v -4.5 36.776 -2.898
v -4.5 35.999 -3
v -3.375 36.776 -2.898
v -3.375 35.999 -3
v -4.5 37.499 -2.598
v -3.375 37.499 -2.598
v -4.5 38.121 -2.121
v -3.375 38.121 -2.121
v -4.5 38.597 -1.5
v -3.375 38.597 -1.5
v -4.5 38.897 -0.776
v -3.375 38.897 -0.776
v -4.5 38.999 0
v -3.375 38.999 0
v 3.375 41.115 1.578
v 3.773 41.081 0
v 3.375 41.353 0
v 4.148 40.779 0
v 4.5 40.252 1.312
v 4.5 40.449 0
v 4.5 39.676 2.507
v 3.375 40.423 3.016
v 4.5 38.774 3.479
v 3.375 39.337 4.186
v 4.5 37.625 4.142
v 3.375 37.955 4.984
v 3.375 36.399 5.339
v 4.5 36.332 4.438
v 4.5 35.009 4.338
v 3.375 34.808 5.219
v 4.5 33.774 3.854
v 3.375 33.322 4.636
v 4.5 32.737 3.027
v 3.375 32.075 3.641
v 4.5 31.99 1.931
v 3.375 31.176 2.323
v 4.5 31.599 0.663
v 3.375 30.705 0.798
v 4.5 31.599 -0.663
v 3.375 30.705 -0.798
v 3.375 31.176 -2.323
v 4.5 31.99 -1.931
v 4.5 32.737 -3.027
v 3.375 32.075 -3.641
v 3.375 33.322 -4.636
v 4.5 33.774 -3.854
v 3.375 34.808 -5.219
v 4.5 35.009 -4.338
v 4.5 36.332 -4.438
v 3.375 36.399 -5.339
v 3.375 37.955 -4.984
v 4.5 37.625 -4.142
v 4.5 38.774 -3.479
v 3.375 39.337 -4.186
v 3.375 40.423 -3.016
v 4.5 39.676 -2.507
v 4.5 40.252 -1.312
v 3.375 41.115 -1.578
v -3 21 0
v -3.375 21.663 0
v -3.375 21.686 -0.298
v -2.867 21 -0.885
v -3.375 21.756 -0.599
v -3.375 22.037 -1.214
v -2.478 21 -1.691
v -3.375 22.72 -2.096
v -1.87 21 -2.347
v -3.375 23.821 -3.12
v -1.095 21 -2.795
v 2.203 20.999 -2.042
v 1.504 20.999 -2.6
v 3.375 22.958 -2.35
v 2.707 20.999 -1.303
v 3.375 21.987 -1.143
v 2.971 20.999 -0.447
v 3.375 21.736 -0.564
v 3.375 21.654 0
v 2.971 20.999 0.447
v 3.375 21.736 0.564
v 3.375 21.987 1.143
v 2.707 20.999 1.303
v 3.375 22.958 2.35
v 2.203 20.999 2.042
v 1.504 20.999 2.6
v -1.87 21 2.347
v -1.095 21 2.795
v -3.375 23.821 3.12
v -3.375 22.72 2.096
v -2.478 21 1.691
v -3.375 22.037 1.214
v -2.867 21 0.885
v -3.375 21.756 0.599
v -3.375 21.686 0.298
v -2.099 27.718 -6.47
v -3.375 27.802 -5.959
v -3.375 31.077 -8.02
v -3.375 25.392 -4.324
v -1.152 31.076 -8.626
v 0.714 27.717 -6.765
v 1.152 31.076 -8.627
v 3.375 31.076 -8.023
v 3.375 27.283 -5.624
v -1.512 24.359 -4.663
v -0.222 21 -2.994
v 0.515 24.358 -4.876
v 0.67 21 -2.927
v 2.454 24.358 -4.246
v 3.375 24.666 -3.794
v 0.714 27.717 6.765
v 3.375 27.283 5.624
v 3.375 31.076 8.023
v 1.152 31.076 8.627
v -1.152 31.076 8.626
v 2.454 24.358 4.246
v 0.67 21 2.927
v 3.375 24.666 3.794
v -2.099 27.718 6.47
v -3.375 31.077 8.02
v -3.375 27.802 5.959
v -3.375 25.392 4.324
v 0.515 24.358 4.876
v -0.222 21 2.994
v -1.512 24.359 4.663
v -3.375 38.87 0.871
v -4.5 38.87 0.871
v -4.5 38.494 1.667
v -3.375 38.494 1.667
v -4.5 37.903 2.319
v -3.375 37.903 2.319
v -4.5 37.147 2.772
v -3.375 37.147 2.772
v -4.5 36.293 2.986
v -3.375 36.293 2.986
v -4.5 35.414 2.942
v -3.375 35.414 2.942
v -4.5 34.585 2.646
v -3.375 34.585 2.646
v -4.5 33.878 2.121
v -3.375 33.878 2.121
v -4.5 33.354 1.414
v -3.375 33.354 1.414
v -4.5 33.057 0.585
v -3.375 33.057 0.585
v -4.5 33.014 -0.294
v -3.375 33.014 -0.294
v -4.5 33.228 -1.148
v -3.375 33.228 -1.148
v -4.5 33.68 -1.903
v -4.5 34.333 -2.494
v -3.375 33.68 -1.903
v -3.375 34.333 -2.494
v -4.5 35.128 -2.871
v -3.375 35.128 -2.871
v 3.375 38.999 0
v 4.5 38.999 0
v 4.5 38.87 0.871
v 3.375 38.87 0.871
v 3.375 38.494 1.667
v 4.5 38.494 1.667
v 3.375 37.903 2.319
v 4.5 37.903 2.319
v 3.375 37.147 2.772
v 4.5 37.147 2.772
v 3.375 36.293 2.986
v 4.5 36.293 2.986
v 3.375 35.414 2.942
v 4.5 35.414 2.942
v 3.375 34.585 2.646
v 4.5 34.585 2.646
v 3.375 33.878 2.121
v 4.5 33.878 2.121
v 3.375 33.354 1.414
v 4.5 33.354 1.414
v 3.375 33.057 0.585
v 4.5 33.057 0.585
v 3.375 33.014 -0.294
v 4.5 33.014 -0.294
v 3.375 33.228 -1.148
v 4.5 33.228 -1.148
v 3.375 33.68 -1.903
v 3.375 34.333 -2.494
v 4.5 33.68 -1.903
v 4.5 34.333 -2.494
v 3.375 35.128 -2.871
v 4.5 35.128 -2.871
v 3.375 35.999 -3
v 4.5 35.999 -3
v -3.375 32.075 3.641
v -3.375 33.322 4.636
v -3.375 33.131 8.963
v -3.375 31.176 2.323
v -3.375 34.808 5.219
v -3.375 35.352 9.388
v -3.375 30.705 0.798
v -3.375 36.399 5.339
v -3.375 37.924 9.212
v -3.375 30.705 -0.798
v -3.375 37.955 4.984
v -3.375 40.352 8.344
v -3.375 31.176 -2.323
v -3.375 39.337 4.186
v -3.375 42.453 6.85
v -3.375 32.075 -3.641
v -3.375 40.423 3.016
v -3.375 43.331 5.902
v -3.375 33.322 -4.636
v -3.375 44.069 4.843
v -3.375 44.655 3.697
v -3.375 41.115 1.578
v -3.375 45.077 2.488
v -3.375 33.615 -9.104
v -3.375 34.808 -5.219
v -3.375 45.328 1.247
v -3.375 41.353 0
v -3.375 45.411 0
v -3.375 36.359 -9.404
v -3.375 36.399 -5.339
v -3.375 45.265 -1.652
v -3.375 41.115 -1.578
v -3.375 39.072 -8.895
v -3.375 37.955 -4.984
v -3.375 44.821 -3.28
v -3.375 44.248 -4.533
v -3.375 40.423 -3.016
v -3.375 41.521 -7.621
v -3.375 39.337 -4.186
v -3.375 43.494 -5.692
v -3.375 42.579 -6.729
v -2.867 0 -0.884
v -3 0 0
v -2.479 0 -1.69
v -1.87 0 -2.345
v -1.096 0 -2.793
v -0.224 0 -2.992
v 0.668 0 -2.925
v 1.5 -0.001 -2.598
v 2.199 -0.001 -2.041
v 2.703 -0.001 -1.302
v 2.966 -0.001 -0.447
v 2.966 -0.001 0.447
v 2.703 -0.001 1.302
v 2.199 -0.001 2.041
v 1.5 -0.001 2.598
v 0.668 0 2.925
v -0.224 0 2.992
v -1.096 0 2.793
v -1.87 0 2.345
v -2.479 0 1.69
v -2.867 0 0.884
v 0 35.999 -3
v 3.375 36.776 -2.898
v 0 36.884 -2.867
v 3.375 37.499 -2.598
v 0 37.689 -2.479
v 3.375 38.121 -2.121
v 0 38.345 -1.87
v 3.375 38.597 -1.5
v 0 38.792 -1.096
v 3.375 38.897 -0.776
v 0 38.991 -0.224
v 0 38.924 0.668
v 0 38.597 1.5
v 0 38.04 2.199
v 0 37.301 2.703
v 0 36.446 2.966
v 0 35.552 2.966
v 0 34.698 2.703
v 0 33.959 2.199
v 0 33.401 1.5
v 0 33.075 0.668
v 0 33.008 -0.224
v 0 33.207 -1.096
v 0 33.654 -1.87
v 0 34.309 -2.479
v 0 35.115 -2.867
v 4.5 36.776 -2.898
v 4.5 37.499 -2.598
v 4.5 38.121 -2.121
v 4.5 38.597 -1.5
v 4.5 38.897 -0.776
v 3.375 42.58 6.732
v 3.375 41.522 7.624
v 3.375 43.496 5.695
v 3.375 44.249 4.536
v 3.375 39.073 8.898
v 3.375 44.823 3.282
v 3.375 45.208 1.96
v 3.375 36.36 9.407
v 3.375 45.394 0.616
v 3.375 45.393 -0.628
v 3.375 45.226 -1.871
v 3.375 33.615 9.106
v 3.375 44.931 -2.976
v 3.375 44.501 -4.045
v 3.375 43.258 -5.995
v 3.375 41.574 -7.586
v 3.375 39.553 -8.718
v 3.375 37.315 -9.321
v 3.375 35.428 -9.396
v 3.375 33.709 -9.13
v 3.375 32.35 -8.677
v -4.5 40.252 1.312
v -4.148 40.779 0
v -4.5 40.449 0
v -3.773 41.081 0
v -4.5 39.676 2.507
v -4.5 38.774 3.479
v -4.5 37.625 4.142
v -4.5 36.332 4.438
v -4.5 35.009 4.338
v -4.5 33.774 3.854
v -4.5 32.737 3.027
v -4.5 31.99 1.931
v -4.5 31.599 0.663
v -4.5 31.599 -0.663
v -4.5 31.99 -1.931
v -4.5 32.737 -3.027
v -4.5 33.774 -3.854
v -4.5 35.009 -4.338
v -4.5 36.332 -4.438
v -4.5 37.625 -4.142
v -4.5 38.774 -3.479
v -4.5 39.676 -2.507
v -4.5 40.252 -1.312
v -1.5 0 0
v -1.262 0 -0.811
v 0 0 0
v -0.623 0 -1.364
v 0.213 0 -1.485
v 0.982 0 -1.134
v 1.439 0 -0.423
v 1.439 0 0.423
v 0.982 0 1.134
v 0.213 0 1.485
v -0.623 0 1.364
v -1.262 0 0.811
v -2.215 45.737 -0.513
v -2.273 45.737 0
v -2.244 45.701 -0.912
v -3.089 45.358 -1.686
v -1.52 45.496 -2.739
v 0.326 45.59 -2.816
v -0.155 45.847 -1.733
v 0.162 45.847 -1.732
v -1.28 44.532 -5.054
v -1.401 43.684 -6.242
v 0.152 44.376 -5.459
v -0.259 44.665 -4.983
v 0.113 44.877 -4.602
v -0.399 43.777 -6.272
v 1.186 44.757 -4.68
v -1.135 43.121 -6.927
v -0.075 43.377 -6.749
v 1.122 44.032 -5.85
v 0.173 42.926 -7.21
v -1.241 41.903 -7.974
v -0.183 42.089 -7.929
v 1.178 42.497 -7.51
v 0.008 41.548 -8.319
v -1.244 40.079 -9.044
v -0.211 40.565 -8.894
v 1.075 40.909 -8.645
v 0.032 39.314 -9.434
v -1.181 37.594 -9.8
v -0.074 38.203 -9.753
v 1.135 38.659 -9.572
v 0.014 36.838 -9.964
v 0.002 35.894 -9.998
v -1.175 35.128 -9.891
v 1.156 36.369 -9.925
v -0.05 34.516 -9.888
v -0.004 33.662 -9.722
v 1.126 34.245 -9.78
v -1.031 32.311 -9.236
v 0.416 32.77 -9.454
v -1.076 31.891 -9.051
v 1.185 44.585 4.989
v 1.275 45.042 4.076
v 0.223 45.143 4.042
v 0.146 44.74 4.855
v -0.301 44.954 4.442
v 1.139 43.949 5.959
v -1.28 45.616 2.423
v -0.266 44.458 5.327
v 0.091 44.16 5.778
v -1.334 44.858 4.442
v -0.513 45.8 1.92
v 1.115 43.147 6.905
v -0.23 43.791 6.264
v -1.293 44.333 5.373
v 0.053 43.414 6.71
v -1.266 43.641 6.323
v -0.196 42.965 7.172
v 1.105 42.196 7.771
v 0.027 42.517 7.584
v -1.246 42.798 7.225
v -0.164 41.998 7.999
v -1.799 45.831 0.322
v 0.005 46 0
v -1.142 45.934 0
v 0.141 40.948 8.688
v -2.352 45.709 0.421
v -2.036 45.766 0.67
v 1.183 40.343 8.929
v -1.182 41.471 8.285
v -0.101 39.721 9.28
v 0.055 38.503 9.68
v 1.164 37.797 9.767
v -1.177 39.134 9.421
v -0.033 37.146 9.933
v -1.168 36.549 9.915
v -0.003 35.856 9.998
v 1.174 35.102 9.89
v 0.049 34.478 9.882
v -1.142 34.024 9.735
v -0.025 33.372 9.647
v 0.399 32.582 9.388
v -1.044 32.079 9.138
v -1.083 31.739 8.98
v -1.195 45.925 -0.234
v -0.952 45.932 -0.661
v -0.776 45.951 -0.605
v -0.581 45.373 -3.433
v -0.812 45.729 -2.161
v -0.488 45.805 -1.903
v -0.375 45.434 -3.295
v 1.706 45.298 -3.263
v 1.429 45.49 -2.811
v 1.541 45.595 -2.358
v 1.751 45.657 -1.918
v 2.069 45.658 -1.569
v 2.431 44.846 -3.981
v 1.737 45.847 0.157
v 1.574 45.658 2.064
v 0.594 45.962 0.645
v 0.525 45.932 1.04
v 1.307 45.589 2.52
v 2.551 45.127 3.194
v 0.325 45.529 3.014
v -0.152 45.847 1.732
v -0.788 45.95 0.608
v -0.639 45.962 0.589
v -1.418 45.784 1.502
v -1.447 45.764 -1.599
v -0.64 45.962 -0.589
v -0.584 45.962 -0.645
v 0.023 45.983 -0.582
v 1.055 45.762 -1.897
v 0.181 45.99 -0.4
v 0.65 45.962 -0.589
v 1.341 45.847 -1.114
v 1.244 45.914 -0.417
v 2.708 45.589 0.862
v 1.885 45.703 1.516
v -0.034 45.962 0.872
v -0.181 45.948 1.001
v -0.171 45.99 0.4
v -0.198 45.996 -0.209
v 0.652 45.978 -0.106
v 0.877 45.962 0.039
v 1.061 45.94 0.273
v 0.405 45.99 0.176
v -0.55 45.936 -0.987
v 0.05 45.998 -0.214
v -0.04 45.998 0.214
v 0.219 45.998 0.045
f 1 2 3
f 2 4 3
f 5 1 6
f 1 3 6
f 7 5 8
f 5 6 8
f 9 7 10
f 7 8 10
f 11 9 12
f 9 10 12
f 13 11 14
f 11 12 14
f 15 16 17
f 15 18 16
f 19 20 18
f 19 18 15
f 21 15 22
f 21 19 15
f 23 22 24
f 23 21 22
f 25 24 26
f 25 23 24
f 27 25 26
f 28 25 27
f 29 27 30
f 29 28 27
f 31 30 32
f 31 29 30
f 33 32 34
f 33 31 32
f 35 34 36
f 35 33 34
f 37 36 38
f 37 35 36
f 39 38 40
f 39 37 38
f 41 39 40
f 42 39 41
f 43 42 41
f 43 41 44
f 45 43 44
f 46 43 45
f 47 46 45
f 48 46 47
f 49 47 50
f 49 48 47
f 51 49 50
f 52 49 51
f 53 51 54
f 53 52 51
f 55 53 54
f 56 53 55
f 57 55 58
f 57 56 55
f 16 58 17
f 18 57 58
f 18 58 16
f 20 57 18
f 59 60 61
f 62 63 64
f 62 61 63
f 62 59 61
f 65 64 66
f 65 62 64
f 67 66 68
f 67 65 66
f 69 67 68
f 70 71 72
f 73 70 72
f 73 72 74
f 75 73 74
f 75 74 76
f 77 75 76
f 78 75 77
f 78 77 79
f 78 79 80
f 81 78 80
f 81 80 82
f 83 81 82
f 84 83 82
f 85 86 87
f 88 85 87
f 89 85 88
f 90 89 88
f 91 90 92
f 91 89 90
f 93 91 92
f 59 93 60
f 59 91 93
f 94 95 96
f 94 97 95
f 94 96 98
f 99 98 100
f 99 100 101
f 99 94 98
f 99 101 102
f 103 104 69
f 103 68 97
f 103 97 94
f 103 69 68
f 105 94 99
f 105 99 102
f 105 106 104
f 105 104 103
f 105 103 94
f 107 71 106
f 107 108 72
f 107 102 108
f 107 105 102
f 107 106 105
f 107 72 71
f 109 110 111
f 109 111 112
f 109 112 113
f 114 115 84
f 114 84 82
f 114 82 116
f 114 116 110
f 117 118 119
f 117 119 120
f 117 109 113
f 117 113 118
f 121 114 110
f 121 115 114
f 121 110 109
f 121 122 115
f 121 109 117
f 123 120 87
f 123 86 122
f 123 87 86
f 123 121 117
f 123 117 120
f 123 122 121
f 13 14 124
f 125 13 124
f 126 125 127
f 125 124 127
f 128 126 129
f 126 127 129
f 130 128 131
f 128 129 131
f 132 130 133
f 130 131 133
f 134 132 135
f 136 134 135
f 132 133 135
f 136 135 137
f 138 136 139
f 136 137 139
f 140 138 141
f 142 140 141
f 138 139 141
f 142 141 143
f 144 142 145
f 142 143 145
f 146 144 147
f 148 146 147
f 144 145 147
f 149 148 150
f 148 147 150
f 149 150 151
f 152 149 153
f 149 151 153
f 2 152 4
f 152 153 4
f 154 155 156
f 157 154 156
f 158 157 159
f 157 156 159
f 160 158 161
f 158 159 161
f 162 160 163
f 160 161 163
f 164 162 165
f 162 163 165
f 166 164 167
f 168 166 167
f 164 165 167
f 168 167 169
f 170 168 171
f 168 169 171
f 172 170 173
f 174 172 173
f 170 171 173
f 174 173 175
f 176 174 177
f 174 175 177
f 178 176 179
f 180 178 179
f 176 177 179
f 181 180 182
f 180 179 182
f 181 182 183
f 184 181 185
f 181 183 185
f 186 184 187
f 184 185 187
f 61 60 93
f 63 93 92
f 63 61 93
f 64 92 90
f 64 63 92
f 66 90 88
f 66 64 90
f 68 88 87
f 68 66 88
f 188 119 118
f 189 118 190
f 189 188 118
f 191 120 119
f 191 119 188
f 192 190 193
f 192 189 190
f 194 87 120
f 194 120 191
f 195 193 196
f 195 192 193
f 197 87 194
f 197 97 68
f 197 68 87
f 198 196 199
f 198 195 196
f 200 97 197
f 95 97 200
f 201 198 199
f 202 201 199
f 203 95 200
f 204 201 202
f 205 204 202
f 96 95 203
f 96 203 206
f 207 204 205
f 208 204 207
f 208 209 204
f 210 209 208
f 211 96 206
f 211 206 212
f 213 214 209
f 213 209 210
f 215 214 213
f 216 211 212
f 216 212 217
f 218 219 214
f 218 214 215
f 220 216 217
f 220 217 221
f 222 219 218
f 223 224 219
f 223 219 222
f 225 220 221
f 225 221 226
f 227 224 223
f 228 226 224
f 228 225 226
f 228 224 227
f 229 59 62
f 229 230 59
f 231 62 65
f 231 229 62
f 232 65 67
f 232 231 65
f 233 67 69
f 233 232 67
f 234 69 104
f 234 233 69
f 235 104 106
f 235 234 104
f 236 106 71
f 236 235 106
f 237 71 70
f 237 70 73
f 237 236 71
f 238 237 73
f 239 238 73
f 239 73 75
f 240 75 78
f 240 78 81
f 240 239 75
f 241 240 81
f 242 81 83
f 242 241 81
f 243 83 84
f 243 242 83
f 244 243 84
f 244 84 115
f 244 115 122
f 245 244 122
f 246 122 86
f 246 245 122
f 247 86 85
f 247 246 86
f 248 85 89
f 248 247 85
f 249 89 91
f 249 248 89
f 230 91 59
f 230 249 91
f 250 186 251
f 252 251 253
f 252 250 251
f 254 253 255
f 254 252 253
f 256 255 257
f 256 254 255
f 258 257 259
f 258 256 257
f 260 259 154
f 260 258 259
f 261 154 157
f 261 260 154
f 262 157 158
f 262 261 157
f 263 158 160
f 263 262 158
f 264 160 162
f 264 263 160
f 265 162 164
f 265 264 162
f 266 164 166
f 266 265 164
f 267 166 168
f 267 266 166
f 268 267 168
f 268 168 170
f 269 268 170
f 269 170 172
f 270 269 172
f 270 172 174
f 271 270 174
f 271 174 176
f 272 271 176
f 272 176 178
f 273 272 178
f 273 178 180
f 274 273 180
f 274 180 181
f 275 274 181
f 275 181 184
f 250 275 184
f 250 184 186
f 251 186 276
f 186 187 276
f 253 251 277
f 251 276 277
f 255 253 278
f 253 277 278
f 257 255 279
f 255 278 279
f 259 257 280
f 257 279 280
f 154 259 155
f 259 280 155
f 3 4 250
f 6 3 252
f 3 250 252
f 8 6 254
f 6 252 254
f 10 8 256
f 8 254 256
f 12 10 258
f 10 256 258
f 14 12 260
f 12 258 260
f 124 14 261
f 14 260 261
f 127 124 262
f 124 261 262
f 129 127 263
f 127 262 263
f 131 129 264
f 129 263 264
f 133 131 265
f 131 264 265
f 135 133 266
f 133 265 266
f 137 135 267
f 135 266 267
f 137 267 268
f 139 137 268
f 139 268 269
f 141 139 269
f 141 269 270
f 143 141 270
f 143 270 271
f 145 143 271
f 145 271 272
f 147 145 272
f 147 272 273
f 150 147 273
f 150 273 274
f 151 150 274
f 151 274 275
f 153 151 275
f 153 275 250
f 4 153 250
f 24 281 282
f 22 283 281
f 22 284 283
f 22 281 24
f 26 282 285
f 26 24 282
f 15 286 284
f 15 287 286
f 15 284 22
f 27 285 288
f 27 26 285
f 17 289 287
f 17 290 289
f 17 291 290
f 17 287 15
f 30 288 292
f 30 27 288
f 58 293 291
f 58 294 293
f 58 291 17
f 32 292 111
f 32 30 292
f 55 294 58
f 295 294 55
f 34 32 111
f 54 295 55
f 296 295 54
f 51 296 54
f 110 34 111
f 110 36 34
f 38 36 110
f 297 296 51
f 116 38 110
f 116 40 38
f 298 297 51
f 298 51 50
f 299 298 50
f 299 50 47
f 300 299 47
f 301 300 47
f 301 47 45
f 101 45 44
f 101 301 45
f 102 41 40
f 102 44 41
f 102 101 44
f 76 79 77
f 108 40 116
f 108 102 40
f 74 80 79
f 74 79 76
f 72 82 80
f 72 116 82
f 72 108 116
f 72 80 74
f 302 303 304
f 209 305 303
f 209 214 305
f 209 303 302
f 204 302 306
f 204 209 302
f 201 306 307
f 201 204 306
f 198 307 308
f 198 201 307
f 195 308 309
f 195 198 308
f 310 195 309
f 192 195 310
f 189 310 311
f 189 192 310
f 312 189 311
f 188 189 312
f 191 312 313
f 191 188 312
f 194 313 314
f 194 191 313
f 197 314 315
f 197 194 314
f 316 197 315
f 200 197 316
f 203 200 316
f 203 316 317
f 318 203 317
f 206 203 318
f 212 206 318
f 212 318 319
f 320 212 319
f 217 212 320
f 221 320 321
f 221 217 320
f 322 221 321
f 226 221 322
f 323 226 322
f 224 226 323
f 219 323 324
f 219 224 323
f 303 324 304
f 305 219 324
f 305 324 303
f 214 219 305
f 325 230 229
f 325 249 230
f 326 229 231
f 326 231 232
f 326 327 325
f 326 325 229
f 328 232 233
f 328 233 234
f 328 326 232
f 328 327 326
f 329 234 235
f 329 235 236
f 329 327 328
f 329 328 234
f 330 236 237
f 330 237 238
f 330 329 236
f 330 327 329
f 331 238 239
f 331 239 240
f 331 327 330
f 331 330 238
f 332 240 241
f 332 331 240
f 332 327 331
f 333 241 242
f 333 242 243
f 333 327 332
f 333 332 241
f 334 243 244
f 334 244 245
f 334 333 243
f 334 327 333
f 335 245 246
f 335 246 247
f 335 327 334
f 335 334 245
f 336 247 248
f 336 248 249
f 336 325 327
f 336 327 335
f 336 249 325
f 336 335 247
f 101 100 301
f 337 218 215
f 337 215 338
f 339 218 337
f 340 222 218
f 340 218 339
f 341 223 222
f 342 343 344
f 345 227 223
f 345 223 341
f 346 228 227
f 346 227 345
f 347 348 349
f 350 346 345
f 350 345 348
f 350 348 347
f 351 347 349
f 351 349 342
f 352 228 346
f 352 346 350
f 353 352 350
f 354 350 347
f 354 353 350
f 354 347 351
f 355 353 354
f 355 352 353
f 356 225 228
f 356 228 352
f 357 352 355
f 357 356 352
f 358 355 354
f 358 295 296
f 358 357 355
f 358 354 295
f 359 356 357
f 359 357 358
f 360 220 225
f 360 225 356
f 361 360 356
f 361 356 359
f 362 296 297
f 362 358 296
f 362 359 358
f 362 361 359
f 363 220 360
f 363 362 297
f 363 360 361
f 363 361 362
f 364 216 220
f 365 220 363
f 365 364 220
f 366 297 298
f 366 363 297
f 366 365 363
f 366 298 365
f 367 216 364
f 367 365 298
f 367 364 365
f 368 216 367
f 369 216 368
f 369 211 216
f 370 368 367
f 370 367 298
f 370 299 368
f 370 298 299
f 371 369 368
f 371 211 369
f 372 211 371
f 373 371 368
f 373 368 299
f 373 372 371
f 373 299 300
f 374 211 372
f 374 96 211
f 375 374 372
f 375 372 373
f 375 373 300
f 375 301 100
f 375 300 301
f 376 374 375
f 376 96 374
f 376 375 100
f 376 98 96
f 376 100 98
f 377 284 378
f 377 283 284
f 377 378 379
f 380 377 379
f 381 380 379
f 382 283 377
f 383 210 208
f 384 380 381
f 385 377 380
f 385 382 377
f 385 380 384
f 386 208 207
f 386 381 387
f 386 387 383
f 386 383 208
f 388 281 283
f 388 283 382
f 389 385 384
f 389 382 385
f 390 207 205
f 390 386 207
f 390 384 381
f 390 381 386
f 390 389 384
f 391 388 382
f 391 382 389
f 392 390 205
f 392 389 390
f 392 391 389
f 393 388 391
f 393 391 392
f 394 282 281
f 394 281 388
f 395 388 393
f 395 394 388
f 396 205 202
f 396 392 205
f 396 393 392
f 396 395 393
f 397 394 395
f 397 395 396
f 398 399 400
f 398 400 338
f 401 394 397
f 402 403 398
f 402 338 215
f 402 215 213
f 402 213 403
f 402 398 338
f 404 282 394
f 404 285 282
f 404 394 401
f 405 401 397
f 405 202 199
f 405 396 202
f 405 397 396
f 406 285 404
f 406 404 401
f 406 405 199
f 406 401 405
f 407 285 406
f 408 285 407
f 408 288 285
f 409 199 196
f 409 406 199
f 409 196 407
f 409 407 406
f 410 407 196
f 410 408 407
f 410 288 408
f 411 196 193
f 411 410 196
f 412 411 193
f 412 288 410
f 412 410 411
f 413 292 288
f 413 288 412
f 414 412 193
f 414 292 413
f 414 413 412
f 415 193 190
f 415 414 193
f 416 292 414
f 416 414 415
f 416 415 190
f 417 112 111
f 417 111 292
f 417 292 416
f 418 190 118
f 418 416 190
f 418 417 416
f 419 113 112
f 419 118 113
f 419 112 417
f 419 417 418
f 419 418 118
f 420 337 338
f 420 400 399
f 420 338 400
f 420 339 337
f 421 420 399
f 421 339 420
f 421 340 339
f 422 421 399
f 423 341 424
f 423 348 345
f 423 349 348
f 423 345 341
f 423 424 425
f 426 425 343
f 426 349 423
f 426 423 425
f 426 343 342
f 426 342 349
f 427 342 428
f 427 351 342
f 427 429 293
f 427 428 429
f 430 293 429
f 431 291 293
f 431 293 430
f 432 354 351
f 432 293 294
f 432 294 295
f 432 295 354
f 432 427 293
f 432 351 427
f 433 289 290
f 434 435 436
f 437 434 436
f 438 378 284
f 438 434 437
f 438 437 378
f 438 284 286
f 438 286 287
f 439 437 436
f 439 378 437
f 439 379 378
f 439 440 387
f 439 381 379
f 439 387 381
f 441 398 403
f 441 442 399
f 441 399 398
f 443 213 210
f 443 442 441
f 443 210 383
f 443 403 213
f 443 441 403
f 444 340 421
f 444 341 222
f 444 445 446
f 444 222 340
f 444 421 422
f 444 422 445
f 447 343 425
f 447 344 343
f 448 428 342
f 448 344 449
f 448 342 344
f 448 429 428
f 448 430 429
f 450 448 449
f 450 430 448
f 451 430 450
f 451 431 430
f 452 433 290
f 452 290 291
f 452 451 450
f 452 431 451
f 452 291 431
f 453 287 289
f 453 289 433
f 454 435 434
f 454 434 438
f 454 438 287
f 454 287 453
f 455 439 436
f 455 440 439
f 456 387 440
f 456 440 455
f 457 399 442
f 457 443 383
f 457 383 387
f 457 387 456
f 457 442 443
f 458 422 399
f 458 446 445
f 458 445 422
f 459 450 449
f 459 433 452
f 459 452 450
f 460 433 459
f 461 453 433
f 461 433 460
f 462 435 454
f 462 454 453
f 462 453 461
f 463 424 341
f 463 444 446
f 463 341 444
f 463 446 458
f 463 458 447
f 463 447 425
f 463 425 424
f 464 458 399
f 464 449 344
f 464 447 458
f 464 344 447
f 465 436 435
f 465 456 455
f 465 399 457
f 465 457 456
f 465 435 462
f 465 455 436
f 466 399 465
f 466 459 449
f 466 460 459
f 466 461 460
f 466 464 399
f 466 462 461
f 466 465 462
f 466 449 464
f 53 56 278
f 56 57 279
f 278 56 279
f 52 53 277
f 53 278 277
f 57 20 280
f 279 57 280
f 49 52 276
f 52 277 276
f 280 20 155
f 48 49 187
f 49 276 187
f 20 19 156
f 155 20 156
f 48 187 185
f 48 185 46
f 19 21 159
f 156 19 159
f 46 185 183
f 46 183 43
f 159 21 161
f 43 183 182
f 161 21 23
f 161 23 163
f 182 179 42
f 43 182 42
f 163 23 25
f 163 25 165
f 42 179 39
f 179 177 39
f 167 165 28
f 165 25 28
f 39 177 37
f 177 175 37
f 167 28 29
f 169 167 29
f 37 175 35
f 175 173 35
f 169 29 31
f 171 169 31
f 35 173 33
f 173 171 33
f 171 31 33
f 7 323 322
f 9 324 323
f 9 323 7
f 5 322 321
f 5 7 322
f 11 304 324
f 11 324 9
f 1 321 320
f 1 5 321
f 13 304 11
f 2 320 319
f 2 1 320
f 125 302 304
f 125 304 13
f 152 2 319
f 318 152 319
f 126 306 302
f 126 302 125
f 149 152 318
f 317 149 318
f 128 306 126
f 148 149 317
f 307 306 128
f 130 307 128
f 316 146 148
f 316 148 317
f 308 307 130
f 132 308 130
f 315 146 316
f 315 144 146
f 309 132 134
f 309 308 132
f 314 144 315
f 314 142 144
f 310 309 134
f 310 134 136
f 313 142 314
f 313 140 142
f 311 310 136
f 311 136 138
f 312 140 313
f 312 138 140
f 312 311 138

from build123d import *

# Parameters (mm, degrees)
WYTNIJ_WYCI_GNI_CIE1_DEPTH      = 10.998876849
WYTNIJ_WYCI_GNI_CIE1_DEPTH_BACK = 10.998876849
SZKIC4_W                        = 1.45
SZKIC4_H                        = 9
SZKIC8_R                        = 3
WYTNIJ_WYCI_GNI_CIE3_DEPTH      = 5.5
WYTNIJ_WYCI_GNI_CIE3_DEPTH_BACK = 5.5


with BuildPart() as part:
    # Szkic1 one side → Obrót4 (revolve)
    with BuildSketch(Plane.XY):
        with BuildLine():
            Line((-3, 21), (-3, 0))
            Line((-3, 0), (0, 0))
            Line((0, 0), (0.005166955, 46))
            ThreePointArc((0.005166955, 46), (-8.632770826, 41.038455208), (-8.699205566, 31.077206177))
            Line((-8.699205566, 31.077206177), (-3, 21))
        make_face()
    revolve(axis=Axis((0.005166955, 46, 0), (-0.000112325, -0.999999994, 0)))

    # Szkic2 → Wytnij-wyciągnięcie1 (cut, two sides)
    with BuildSketch(Plane.XY) as wytnij_wyci_gni_cie1_sk:
        Polygon((-3.375, 46), (-20, 46), (-20, 10.866665268), (-3.375, 21.663066505), align=None)
        Polygon((20, 46), (3.375, 46), (3.375, 21.65370739), (20, 10.857306153), align=None)
    extrude(amount=WYTNIJ_WYCI_GNI_CIE1_DEPTH, mode=Mode.SUBTRACT)
    extrude(wytnij_wyci_gni_cie1_sk.sketch, amount=-WYTNIJ_WYCI_GNI_CIE1_DEPTH_BACK, mode=Mode.SUBTRACT)

    # Szkic4 → Obrót5 (revolve)
    with BuildSketch(Plane.YX):
        with BuildLine():
            Line((40.449326049, 4.5), (40.449326049, -4.5))
            ThreePointArc((40.449326049, -4.5), (41.839498769, -2.438212993), (42.328030498, 0))
            ThreePointArc((42.328030498, 0), (41.839498769, 2.438212993), (40.449326049, 4.5))
        make_face()
        with Locations((39.724326049, 0)):
            Rectangle(SZKIC4_W, SZKIC4_H)
    revolve(axis=Axis((-0.999999975, 35.999326049, 0), (1, 0, 0)))

    # Szkic8 → Wytnij-wyciągnięcie3 (cut, two sides)
    with BuildSketch(Plane(origin=(0, 0, 0), x_dir=(0, 0, -1), z_dir=(1, 0, 0))) as wytnij_wyci_gni_cie3_sk:
        with Locations((0, 35.999326049)):
            Circle(SZKIC8_R)
    extrude(amount=WYTNIJ_WYCI_GNI_CIE3_DEPTH, mode=Mode.SUBTRACT)
    extrude(wytnij_wyci_gni_cie3_sk.sketch, amount=-WYTNIJ_WYCI_GNI_CIE3_DEPTH_BACK, mode=Mode.SUBTRACT)


solid = part.part
